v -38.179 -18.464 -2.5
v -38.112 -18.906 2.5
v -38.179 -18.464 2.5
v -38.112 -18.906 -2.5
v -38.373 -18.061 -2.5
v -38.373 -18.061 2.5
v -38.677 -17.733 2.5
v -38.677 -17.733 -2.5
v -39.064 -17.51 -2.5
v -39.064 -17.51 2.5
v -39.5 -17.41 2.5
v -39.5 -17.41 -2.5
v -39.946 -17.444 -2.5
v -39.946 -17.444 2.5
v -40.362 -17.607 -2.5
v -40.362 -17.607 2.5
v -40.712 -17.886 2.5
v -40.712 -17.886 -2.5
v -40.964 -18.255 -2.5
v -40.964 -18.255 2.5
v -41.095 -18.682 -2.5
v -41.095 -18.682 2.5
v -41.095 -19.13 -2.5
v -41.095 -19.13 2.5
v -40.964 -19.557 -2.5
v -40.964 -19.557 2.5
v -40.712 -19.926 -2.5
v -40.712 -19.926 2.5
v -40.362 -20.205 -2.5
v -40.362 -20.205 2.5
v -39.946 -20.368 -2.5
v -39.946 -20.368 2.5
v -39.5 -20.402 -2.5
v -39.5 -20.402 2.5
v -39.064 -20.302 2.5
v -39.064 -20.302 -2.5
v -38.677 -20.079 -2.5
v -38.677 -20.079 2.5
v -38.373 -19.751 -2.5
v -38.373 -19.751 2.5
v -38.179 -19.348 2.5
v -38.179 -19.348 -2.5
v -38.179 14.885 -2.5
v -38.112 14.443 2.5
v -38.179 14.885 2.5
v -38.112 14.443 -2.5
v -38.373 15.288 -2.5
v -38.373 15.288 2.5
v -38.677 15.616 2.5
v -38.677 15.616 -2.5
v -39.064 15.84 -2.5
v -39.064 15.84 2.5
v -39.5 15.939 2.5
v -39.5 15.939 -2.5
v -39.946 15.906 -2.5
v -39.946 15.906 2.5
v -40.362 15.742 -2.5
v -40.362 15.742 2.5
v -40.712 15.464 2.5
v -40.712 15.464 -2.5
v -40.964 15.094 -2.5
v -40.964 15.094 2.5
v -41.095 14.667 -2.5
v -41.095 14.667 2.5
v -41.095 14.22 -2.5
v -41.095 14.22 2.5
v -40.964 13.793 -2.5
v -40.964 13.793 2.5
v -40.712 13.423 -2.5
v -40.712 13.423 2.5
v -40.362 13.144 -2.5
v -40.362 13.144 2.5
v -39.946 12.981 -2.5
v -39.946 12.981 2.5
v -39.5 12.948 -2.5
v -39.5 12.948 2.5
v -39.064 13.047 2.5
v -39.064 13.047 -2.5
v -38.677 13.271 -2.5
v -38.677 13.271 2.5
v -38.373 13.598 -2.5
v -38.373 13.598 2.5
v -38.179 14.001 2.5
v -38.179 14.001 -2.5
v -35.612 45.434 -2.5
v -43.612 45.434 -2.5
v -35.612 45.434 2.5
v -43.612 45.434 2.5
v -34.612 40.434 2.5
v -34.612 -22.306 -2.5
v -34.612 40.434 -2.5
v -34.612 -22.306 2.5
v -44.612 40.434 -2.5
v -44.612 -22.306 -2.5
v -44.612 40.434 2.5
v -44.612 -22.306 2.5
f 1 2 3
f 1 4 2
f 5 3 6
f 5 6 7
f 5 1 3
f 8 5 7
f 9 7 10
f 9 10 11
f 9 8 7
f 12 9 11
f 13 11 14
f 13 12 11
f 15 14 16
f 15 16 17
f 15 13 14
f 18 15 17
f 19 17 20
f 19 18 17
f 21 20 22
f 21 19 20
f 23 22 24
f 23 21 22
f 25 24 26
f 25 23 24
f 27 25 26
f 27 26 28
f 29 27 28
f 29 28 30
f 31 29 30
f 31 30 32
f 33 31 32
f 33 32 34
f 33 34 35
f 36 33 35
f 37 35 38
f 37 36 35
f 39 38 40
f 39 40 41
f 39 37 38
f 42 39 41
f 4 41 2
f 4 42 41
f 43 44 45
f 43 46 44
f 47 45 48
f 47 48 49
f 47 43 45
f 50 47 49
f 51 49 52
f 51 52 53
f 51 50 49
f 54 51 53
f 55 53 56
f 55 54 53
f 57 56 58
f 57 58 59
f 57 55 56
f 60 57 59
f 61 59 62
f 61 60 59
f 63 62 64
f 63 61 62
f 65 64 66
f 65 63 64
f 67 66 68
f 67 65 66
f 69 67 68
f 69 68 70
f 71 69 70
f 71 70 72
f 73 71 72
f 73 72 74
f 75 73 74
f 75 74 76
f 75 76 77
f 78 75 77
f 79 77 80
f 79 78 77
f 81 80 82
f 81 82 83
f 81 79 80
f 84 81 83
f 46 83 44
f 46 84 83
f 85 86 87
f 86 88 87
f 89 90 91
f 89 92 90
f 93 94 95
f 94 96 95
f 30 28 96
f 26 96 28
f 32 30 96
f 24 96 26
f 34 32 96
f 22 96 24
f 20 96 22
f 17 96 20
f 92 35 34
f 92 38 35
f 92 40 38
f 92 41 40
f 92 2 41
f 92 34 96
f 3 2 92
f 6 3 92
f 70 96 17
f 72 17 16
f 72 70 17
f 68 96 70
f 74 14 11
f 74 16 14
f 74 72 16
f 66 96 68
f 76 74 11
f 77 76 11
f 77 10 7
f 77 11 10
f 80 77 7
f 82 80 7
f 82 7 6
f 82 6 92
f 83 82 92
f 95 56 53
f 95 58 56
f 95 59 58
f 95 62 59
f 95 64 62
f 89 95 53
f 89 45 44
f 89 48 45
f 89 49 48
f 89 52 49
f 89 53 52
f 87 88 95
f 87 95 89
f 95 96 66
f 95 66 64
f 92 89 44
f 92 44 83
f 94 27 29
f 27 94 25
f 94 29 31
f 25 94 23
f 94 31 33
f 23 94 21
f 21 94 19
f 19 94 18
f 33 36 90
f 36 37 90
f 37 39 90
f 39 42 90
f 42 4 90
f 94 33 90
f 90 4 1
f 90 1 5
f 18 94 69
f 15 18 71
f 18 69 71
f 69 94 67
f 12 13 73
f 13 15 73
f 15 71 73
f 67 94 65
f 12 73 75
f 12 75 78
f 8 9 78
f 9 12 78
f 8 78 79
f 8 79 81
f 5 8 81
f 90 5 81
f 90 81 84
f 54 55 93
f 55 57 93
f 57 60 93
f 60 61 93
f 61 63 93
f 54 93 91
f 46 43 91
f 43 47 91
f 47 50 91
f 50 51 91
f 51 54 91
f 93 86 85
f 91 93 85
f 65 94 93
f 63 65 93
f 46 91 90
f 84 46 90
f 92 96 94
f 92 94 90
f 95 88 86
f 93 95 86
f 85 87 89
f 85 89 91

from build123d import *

# Parameters (mm, degrees)
F0_W       = 10
F0_H       = 67.7401442081
F0_R       = 1.5
F1_DEPTH   = 2.5
F2_SIZE2   = 1
F2_SIZE    = 5
F2_2_SIZE2 = 1
F2_2_SIZE  = 5


with BuildPart() as f1:
    # F0 (on Top) → F1 (new body, symmetric)
    with BuildSketch(Plane.XY):
        with Locations((-39.6120686829, 11.5640377626)):
            Rectangle(F0_W, F0_H)
        with Locations((-39.6120686829, -18.9060343415)):
            Circle(F0_R, mode=Mode.SUBTRACT)
        with Locations((-39.6120686829, 14.4433356585)):
            Circle(F0_R, mode=Mode.SUBTRACT)
    extrude(amount=F1_DEPTH, both=True)

    # F2
    f2_edges = [f1.edges().sort_by_distance(p)[0] for p in [
        (-44.612069, 45.43411, 0),
    ]]
    f2_side = f1.faces().sort_by_distance((-44.612069, 11.564038, 0))[0]
    chamfer(f2_edges, length=F2_SIZE, length2=F2_SIZE2, reference=f2_side)

    # F2#2
    f2_2_edges = [f1.edges().sort_by_distance(p)[0] for p in [
        (-34.612069, 45.43411, 0),
    ]]
    f2_2_side = f1.faces().sort_by_distance((-34.612069, 11.564038, 0))[0]
    chamfer(f2_2_edges, length=F2_2_SIZE, length2=F2_2_SIZE2, reference=f2_2_side)


solid = f1.part
